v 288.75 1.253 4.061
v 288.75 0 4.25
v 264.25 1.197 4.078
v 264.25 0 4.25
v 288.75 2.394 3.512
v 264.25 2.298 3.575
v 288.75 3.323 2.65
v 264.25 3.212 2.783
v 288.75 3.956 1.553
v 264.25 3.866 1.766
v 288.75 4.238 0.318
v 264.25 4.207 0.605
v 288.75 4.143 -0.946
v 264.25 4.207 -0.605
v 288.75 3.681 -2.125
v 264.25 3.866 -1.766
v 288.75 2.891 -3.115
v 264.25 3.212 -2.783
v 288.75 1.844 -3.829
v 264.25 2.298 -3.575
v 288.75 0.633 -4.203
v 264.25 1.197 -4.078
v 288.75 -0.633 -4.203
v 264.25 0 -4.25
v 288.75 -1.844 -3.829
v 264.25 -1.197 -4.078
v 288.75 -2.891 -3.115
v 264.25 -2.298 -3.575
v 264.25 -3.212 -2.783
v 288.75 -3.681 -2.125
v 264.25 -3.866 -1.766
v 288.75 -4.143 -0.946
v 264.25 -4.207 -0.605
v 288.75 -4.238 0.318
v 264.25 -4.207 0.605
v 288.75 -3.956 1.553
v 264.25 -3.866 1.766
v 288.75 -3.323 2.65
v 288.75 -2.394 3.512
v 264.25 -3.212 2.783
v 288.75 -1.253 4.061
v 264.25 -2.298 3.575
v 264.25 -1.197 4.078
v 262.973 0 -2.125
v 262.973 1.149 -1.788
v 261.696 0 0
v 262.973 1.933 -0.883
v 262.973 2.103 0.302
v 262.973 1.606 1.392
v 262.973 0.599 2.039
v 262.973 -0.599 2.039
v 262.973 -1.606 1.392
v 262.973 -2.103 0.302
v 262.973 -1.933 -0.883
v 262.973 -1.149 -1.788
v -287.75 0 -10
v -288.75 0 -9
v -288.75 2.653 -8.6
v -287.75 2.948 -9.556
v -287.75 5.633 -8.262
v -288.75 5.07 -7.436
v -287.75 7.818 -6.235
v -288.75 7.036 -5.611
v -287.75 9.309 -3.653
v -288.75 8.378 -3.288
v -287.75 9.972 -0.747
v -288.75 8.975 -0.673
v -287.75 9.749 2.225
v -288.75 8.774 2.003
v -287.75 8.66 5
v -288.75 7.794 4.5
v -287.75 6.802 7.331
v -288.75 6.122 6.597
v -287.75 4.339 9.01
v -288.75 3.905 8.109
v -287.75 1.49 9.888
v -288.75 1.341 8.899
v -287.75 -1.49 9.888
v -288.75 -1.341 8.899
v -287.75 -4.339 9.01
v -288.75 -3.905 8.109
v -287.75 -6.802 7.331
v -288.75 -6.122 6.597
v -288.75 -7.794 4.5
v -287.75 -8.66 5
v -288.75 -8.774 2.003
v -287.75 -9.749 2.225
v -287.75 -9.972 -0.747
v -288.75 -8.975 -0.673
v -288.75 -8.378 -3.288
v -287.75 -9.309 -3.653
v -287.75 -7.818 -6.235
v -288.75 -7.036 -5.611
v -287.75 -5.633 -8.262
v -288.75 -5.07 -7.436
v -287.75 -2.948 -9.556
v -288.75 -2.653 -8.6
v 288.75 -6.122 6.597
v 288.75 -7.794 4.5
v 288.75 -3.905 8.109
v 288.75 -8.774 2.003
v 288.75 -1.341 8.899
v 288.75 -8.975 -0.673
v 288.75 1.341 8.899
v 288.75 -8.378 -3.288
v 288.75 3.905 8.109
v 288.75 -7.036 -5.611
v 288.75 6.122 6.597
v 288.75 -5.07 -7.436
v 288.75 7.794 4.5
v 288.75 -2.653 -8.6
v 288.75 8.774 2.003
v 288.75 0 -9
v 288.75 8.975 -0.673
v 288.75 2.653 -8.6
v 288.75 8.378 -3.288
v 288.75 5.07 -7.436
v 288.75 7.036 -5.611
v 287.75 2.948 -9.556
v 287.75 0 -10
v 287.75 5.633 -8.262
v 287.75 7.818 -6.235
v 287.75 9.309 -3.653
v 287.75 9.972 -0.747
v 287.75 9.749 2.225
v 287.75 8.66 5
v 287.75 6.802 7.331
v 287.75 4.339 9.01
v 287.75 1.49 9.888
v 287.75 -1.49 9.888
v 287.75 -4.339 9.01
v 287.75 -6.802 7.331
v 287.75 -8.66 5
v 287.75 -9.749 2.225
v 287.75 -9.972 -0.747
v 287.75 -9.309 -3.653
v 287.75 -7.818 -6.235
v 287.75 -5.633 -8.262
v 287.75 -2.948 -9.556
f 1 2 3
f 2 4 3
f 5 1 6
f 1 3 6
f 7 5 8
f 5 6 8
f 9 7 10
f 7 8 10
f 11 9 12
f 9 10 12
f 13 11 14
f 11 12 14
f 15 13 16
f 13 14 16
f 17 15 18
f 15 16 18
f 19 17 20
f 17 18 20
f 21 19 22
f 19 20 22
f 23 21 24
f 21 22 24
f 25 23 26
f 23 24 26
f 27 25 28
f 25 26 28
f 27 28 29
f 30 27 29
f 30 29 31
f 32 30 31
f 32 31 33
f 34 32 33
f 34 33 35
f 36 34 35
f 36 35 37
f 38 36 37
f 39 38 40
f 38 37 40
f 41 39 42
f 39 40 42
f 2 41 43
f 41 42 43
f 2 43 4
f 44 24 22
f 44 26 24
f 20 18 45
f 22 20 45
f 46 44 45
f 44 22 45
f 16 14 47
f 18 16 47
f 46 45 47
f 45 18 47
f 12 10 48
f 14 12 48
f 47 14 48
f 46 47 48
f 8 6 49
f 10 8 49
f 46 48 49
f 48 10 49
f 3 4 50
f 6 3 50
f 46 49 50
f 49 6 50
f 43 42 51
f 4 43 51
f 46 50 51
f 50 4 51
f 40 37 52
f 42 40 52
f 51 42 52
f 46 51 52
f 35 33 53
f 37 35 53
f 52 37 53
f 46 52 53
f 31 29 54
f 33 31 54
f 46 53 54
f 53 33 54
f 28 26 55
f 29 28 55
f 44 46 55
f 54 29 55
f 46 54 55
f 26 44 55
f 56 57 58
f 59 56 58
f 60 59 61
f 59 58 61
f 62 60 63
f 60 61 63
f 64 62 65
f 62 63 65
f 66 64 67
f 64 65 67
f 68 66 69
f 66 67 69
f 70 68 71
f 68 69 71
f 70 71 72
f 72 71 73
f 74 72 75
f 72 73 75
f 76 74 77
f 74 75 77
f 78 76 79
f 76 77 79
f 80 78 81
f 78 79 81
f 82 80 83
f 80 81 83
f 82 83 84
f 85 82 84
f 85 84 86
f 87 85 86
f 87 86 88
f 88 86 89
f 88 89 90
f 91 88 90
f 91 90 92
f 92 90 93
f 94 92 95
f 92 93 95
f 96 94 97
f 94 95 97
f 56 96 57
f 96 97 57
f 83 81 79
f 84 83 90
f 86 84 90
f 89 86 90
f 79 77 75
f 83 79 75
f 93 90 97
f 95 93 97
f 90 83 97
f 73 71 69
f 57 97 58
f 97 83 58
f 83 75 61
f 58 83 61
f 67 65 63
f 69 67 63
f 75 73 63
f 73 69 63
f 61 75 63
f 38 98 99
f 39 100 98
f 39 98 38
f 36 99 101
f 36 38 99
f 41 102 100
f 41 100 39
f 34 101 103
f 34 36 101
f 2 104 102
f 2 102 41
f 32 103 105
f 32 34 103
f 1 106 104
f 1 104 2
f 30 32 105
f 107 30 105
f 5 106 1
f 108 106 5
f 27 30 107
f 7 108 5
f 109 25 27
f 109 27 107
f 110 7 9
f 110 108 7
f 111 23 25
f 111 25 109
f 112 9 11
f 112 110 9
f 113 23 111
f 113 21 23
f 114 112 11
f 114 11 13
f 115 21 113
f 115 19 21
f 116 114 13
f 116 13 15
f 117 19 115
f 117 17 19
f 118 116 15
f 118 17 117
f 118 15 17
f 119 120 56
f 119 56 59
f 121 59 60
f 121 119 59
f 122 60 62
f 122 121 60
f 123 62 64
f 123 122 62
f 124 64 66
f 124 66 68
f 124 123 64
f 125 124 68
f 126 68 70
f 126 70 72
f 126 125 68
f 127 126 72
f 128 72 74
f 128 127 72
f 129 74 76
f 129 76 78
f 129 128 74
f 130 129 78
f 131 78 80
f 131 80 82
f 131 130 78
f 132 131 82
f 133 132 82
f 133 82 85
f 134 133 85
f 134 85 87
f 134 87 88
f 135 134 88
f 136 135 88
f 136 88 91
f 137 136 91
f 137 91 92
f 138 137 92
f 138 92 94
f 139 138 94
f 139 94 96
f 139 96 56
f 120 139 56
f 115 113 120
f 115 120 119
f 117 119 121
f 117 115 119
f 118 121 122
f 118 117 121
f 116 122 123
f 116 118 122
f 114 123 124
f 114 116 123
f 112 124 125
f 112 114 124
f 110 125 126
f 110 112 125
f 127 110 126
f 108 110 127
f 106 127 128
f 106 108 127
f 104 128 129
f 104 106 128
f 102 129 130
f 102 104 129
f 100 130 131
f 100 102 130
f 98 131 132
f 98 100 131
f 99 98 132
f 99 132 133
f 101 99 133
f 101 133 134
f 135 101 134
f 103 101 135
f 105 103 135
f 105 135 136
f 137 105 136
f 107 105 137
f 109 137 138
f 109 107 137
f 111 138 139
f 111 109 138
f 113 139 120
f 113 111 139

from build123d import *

# Parameters (mm, degrees)
SKETCH_1_R      = 10
EXTRUDE_1_DEPTH = 288.75
M10X1_5_1_D     = 8.5
M10X1_5_1_DEPTH = 24.5
M10X1_5_1_TIP   = 2.553657631
CHAMFER_1_SIZE  = 1


with BuildPart() as part:
    # 草图1 → 凸台-拉伸1 (new, symmetric)
    with BuildSketch(Plane(origin=(0, 0, 0), x_dir=(0, 0, -1), z_dir=(1, 0, 0))):
        Circle(SKETCH_1_R)
    extrude(amount=EXTRUDE_1_DEPTH, both=True)

    # M10x1.5 螺纹孔1
    with Locations(Plane(origin=(288.75, 0, 0), x_dir=(0, 0, -1), z_dir=(1, 0, 0))):
        with Locations((0, 0)):
            Hole(M10X1_5_1_D / 2, depth=M10X1_5_1_DEPTH)
            with Locations((0, 0, -(M10X1_5_1_DEPTH + M10X1_5_1_TIP / 2))):  # 118° drill point
                Cone(0, M10X1_5_1_D / 2, M10X1_5_1_TIP, mode=Mode.SUBTRACT)

    # 倒角1
    chamfer_1_edges = [part.edges().sort_by_distance(p)[0] for p in [
        (-288.75, 0, 10),
        (288.75, 0, 10),
    ]]
    chamfer(chamfer_1_edges, length=CHAMFER_1_SIZE)


solid = part.part
